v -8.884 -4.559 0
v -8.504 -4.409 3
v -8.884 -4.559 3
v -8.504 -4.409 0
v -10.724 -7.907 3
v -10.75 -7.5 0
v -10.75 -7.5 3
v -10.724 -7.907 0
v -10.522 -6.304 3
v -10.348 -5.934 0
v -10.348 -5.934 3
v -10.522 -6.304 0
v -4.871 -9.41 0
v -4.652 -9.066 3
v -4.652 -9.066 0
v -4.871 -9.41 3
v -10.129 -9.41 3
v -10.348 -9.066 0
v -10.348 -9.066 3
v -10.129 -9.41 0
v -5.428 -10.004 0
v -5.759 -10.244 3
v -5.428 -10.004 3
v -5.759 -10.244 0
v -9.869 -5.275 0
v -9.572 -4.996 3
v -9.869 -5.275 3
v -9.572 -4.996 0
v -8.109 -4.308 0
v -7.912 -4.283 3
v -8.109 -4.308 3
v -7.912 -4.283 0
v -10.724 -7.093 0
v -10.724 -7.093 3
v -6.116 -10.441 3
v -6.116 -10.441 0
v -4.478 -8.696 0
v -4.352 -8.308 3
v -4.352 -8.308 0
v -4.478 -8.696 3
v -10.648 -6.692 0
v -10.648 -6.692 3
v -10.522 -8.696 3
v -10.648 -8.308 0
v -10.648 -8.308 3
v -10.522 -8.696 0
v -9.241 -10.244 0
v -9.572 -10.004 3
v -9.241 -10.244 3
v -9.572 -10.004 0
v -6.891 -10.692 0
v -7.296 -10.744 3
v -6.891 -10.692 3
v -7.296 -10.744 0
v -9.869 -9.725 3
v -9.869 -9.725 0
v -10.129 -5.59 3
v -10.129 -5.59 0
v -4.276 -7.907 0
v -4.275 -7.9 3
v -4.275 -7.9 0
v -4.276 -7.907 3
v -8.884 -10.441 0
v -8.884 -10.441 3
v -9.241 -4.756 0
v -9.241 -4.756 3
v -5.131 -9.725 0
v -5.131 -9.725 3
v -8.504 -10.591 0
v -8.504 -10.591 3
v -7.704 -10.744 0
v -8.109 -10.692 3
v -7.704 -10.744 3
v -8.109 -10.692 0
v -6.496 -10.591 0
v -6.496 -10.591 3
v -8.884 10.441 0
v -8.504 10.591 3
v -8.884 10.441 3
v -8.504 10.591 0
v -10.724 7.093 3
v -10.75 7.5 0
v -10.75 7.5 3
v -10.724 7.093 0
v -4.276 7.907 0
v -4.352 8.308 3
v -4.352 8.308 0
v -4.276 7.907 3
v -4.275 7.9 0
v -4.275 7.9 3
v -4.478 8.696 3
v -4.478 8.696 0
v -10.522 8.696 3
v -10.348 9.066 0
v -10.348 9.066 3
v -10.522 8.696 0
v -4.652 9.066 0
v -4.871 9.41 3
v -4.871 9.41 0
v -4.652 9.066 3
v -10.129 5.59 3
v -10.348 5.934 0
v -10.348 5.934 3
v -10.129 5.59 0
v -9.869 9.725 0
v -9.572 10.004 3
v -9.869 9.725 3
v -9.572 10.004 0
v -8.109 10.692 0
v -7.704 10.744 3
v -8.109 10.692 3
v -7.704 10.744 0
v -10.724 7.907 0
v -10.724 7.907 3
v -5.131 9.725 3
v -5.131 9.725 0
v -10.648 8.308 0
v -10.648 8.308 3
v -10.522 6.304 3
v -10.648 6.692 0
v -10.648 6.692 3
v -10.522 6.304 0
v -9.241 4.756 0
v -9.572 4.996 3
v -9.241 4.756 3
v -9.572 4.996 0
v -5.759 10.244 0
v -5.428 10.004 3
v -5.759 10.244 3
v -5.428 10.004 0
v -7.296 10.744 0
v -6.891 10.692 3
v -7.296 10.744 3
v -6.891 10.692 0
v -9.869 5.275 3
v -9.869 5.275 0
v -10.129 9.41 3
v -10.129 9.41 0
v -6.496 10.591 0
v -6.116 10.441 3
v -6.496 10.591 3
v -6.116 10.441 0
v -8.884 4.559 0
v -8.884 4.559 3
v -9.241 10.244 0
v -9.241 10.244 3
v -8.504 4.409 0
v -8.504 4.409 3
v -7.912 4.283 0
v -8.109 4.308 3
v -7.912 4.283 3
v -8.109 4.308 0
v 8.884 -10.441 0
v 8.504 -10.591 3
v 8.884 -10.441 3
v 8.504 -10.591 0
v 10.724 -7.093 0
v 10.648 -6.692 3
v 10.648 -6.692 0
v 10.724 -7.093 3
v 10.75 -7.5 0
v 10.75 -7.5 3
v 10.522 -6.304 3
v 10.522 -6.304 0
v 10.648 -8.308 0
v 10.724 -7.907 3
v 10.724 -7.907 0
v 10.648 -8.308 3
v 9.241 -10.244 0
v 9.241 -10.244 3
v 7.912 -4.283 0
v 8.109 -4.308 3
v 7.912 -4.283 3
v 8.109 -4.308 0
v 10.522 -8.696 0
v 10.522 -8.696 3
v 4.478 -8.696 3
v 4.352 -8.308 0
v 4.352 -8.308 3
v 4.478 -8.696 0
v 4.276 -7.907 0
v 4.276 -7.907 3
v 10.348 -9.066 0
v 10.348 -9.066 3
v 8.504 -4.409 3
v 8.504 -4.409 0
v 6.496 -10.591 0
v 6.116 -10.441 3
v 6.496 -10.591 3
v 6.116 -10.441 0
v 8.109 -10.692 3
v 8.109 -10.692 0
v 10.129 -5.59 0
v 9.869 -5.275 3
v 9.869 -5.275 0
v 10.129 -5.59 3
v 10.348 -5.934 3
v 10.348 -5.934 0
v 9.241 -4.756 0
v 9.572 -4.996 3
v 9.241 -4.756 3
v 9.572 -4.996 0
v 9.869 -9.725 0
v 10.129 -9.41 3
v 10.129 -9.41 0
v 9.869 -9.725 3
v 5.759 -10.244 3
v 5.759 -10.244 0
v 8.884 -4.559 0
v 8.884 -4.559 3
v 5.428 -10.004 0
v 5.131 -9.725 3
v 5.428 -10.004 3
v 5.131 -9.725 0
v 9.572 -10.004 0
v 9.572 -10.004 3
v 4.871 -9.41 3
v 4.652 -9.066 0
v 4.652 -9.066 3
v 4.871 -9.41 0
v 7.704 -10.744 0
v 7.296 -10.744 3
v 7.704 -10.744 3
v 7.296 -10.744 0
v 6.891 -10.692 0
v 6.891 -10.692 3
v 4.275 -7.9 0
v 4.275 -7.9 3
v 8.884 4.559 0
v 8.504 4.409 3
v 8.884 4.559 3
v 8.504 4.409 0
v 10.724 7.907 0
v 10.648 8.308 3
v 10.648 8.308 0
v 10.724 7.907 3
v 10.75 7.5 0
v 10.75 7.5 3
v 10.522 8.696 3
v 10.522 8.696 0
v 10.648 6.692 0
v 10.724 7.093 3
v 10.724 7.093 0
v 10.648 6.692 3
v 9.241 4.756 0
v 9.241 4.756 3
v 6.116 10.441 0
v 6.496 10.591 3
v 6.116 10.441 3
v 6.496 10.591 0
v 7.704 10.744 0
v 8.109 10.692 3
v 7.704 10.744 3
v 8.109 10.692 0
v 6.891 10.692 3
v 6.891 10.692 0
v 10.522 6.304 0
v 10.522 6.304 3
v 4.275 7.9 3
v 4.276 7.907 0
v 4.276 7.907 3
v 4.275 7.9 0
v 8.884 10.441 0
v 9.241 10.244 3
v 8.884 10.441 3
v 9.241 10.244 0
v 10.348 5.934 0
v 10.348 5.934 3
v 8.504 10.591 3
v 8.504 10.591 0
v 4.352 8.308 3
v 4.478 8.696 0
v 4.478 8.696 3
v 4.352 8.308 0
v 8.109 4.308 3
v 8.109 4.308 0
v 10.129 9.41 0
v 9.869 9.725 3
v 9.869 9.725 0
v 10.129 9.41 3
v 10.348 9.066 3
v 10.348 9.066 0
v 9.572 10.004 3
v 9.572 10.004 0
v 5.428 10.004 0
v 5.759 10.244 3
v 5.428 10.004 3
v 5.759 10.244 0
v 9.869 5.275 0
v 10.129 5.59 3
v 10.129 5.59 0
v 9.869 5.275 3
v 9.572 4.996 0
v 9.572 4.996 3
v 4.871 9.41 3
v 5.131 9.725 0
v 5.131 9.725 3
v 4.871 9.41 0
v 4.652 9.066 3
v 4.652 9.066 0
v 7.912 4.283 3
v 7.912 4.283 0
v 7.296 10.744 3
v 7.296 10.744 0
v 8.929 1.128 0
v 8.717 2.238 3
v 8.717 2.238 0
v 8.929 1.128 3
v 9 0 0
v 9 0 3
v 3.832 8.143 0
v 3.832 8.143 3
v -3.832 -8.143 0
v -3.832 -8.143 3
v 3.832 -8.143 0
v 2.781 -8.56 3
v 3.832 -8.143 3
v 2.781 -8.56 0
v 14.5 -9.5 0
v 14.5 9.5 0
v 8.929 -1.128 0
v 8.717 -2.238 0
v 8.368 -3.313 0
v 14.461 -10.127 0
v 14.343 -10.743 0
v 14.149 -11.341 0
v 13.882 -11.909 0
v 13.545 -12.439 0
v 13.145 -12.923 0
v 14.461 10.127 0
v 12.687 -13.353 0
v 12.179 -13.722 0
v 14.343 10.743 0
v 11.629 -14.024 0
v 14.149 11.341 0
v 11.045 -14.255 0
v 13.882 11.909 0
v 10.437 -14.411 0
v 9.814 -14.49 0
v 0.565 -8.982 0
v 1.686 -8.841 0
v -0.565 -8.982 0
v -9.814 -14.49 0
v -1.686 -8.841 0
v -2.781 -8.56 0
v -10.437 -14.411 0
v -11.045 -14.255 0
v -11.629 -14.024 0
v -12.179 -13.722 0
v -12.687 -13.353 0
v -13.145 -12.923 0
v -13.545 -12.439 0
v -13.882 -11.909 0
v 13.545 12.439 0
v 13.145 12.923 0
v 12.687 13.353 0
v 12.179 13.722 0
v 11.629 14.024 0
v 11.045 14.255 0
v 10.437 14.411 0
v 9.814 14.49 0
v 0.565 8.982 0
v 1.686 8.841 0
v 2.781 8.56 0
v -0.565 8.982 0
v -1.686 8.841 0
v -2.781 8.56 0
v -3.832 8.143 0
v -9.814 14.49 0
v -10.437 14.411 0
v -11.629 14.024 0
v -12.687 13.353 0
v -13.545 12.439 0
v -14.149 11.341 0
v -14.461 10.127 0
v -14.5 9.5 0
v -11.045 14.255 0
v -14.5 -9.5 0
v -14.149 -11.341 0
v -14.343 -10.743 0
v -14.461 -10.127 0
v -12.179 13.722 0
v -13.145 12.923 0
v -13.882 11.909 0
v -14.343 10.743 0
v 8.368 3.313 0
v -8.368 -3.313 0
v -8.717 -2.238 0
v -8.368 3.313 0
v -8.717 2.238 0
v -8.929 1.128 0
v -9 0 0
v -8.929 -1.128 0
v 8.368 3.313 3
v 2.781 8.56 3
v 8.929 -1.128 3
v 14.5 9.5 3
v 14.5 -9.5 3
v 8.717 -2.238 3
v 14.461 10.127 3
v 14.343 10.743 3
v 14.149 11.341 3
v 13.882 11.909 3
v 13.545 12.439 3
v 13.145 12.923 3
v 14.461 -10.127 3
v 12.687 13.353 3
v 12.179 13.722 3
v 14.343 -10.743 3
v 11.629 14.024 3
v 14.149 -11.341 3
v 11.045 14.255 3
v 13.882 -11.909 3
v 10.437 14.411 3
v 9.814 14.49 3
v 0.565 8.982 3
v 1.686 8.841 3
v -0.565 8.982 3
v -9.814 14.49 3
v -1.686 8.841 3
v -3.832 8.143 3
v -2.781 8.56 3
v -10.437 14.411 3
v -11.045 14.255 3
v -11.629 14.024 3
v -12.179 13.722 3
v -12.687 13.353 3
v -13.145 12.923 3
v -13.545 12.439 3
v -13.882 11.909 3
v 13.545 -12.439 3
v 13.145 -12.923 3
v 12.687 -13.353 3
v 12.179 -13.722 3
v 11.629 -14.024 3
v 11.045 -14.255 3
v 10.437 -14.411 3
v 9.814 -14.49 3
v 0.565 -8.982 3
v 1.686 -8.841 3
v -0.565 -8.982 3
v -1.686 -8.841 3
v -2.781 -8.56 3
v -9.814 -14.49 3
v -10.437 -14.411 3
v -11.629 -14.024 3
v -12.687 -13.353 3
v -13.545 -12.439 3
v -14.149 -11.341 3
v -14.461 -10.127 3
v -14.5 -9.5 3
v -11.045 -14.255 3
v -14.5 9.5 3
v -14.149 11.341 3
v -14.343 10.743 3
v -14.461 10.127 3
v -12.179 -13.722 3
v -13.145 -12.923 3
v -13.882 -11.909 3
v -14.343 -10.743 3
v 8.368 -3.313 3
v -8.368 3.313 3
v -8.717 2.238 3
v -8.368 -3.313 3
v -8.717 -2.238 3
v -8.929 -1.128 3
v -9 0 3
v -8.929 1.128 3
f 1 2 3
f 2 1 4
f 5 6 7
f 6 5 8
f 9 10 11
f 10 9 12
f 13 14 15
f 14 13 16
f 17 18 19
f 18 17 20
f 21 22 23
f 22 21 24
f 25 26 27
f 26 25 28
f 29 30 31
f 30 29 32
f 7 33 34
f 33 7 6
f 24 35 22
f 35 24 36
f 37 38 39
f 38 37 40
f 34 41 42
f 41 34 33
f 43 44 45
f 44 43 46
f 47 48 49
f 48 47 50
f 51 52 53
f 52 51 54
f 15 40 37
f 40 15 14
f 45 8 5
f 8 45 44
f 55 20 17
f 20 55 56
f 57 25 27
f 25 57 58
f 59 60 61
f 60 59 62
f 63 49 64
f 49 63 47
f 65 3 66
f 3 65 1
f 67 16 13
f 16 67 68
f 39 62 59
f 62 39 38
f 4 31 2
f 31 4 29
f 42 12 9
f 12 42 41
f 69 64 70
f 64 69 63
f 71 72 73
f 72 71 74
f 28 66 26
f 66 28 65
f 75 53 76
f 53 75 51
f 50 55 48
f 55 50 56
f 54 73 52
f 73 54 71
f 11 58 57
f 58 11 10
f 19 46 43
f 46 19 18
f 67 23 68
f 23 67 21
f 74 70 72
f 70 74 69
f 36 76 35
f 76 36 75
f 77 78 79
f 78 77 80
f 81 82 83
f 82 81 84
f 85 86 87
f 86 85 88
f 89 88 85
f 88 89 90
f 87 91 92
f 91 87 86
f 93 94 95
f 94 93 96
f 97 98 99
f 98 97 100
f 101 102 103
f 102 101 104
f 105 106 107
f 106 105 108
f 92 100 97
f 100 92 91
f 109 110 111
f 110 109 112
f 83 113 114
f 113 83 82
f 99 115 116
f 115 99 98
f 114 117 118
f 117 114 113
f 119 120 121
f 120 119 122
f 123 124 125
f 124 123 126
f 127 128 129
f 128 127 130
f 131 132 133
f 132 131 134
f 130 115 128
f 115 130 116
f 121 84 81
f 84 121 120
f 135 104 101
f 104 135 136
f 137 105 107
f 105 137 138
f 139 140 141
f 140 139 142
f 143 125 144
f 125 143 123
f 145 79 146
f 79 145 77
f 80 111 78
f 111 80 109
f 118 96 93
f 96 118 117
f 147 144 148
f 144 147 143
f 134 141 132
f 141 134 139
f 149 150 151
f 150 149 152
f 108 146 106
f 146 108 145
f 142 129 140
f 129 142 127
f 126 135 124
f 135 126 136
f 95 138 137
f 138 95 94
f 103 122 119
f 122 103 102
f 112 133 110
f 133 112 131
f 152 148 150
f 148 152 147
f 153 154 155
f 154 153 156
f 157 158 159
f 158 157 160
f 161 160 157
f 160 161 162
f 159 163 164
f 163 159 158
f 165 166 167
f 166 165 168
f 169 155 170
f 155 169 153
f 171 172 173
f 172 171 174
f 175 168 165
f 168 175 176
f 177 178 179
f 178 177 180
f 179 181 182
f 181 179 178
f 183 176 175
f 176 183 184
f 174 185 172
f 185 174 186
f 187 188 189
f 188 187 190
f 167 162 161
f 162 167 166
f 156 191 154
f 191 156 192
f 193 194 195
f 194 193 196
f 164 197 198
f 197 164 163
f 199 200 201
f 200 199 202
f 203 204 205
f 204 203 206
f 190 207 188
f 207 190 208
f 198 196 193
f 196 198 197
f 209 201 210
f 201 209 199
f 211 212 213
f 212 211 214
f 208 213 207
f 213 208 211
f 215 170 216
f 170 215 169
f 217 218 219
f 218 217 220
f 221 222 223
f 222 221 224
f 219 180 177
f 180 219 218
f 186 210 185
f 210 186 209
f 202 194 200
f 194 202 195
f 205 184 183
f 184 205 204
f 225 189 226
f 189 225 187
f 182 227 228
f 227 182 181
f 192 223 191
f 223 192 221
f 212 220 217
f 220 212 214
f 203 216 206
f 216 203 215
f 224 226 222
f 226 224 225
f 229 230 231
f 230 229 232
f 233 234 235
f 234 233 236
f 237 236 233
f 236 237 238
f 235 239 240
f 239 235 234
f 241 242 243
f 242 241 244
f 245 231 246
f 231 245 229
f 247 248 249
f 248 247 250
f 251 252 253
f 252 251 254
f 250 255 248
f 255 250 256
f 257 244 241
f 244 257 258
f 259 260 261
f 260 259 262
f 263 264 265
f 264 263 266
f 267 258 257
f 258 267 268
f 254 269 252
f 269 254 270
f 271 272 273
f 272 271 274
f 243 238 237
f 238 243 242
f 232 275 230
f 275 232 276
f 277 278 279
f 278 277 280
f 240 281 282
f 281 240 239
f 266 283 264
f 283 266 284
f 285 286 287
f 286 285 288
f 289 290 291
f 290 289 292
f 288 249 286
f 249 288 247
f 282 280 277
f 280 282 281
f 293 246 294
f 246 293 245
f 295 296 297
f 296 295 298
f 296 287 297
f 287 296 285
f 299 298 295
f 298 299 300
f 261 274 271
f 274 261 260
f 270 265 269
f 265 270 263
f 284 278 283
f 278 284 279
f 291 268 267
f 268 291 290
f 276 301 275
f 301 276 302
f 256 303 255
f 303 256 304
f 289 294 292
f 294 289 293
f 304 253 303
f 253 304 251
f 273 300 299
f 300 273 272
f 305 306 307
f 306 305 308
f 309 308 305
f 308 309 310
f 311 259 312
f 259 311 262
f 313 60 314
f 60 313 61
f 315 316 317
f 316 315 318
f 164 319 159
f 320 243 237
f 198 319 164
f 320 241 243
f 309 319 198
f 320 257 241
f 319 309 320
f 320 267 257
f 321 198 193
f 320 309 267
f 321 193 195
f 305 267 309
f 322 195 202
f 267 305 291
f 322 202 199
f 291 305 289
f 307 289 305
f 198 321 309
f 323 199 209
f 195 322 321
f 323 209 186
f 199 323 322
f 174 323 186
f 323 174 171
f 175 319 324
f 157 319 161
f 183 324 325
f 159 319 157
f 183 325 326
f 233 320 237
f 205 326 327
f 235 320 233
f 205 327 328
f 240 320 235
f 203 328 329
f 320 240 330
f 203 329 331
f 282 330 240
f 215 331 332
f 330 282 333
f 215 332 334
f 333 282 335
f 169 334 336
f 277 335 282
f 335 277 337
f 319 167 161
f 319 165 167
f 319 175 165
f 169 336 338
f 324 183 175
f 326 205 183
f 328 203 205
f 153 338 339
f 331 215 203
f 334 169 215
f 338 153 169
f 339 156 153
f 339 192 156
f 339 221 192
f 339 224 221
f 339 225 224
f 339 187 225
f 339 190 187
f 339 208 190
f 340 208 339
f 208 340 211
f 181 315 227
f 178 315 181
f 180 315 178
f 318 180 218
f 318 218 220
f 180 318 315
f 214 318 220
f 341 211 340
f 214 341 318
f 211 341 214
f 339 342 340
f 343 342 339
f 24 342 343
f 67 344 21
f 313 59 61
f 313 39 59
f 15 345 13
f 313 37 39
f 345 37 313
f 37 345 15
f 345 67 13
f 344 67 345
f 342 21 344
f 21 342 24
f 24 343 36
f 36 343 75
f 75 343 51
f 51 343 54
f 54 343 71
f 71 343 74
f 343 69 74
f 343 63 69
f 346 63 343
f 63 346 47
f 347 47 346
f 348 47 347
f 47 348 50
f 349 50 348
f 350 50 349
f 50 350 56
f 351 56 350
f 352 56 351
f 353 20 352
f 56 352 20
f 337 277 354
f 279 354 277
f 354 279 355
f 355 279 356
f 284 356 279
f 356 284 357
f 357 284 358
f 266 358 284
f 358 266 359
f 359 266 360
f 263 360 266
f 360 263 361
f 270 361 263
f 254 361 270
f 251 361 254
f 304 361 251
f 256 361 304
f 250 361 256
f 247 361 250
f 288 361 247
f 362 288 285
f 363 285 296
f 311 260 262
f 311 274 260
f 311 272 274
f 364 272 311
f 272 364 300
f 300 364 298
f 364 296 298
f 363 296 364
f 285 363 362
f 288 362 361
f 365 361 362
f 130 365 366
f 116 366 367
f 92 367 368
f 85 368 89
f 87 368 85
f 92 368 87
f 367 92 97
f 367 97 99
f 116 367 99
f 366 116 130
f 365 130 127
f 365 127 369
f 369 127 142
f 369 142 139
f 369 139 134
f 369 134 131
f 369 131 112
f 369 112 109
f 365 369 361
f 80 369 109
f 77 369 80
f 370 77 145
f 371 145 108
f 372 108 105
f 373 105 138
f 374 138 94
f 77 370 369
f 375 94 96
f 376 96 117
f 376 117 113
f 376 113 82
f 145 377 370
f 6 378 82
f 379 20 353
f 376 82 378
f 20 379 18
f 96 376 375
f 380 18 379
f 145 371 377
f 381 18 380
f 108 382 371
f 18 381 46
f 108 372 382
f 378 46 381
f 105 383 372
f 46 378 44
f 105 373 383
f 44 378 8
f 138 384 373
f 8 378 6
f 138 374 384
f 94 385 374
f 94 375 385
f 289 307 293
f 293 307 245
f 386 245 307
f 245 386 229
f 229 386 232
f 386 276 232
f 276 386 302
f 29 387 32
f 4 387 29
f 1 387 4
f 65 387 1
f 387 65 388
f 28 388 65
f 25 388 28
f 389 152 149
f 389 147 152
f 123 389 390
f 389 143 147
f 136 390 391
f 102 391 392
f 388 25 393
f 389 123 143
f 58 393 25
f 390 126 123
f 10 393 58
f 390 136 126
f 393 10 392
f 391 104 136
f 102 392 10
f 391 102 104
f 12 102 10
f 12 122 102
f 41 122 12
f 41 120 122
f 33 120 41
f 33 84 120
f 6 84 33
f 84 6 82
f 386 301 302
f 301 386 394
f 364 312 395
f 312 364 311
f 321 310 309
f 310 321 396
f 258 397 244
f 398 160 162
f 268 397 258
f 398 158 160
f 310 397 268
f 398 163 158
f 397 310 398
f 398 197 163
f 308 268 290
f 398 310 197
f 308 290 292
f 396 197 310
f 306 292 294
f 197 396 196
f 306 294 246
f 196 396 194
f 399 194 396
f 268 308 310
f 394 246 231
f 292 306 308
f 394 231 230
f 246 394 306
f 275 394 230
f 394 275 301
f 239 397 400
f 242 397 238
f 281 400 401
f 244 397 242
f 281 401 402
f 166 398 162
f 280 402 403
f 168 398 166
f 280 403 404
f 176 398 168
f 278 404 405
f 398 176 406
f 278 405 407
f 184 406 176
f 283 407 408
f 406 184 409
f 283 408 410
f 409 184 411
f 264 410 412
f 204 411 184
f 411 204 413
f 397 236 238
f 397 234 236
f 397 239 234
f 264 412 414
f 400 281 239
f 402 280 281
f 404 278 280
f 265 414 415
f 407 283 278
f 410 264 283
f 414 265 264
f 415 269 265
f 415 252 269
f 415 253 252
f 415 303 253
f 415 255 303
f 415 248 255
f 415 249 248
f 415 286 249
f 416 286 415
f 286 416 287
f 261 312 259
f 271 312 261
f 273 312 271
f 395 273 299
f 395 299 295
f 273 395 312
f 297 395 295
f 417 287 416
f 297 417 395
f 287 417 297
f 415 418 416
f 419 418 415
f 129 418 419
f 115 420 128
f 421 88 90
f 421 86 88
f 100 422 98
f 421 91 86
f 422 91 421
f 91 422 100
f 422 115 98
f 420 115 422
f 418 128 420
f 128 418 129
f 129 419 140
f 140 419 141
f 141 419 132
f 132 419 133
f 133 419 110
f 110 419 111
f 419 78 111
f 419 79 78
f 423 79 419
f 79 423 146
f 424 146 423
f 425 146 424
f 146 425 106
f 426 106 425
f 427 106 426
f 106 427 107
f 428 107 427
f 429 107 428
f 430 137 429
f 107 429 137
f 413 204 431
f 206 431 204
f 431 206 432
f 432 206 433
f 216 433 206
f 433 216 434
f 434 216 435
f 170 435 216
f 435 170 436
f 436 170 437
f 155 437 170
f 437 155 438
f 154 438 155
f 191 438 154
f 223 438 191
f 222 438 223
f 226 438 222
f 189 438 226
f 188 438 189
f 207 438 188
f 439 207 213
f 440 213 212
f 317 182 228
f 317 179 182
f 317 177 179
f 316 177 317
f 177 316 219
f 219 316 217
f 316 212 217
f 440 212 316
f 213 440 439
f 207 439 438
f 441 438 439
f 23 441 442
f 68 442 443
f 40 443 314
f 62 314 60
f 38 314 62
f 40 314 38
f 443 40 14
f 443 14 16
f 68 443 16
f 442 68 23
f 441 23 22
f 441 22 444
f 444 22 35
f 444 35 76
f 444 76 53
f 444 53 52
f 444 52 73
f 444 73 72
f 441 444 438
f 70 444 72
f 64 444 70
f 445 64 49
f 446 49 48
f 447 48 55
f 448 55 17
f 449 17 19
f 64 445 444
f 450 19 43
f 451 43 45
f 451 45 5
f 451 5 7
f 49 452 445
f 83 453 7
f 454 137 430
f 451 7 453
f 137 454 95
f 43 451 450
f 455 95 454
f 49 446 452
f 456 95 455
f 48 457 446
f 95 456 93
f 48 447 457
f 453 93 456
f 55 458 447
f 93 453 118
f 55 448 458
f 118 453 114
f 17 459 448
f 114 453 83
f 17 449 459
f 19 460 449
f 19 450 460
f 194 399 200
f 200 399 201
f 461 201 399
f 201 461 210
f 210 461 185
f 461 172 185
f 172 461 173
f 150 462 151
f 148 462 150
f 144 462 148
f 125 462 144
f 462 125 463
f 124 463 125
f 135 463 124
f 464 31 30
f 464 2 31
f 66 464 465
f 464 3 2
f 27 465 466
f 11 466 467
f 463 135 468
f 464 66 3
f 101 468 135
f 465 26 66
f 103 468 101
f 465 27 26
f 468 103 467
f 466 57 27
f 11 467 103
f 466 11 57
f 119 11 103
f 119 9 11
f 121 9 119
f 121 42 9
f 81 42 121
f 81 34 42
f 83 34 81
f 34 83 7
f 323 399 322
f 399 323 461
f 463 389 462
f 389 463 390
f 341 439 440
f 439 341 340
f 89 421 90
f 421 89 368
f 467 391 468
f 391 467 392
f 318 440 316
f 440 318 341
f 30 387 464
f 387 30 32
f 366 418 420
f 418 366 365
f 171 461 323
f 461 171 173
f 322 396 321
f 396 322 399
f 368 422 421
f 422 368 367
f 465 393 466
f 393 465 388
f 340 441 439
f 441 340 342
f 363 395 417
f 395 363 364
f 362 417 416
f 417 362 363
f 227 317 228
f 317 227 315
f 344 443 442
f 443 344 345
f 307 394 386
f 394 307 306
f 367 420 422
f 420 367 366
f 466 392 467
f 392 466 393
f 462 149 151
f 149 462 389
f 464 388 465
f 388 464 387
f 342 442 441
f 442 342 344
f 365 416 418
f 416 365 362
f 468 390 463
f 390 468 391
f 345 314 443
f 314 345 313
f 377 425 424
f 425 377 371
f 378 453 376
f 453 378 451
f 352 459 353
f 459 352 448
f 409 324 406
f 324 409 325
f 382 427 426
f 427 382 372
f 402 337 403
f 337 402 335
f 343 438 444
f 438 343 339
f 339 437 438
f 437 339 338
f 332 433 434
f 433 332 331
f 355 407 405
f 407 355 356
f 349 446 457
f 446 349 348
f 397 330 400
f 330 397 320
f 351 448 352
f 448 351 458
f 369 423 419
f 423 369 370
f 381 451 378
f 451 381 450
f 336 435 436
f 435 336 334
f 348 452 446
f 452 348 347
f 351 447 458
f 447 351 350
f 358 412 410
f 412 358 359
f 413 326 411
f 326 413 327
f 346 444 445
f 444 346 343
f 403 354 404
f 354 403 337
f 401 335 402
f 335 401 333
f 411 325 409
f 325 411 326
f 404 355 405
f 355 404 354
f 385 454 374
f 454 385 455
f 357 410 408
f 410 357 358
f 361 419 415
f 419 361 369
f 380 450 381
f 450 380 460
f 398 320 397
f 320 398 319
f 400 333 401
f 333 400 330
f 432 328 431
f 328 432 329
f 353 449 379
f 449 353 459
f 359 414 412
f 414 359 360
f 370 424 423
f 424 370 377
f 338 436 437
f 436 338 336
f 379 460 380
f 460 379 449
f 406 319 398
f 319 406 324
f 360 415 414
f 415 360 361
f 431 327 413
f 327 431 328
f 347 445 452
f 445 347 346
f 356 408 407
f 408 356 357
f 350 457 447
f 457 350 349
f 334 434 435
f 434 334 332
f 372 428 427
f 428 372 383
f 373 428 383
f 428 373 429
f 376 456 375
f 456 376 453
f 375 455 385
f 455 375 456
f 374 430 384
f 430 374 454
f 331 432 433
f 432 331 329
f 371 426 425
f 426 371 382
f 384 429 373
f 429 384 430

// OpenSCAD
$fn = 50;

difference() {
	union() {
		hull() {
			translate(v = [-9.5, 9.5, 0]) {
				cylinder(h = 3, r = 5);
			}
			translate(v = [9.5, 9.5, 0]) {
				cylinder(h = 3, r = 5);
			}
			translate(v = [-9.5, -9.5, 0]) {
				cylinder(h = 3, r = 5);
			}
			translate(v = [9.5, -9.5, 0]) {
				cylinder(h = 3, r = 5);
			}
		}
	}
	union() {
		translate(v = [-7.5, -7.5, -100.0]) {
			cylinder(h = 200, r = 3.25);
		}
		translate(v = [-7.5, 7.5, -100.0]) {
			cylinder(h = 200, r = 3.25);
		}
		translate(v = [7.5, -7.5, -100.0]) {
			cylinder(h = 200, r = 3.25);
		}
		translate(v = [7.5, 7.5, -100.0]) {
			cylinder(h = 200, r = 3.25);
		}
		translate(v = [-7.5, -7.5, -100.0]) {
			cylinder(h = 200, r = 1.8);
		}
		translate(v = [-7.5, 7.5, -100.0]) {
			cylinder(h = 200, r = 1.8);
		}
		translate(v = [7.5, -7.5, -100.0]) {
			cylinder(h = 200, r = 1.8);
		}
		translate(v = [7.5, 7.5, -100.0]) {
			cylinder(h = 200, r = 1.8);
		}
		cylinder(h = 3, r = 9.0);
	}
}
